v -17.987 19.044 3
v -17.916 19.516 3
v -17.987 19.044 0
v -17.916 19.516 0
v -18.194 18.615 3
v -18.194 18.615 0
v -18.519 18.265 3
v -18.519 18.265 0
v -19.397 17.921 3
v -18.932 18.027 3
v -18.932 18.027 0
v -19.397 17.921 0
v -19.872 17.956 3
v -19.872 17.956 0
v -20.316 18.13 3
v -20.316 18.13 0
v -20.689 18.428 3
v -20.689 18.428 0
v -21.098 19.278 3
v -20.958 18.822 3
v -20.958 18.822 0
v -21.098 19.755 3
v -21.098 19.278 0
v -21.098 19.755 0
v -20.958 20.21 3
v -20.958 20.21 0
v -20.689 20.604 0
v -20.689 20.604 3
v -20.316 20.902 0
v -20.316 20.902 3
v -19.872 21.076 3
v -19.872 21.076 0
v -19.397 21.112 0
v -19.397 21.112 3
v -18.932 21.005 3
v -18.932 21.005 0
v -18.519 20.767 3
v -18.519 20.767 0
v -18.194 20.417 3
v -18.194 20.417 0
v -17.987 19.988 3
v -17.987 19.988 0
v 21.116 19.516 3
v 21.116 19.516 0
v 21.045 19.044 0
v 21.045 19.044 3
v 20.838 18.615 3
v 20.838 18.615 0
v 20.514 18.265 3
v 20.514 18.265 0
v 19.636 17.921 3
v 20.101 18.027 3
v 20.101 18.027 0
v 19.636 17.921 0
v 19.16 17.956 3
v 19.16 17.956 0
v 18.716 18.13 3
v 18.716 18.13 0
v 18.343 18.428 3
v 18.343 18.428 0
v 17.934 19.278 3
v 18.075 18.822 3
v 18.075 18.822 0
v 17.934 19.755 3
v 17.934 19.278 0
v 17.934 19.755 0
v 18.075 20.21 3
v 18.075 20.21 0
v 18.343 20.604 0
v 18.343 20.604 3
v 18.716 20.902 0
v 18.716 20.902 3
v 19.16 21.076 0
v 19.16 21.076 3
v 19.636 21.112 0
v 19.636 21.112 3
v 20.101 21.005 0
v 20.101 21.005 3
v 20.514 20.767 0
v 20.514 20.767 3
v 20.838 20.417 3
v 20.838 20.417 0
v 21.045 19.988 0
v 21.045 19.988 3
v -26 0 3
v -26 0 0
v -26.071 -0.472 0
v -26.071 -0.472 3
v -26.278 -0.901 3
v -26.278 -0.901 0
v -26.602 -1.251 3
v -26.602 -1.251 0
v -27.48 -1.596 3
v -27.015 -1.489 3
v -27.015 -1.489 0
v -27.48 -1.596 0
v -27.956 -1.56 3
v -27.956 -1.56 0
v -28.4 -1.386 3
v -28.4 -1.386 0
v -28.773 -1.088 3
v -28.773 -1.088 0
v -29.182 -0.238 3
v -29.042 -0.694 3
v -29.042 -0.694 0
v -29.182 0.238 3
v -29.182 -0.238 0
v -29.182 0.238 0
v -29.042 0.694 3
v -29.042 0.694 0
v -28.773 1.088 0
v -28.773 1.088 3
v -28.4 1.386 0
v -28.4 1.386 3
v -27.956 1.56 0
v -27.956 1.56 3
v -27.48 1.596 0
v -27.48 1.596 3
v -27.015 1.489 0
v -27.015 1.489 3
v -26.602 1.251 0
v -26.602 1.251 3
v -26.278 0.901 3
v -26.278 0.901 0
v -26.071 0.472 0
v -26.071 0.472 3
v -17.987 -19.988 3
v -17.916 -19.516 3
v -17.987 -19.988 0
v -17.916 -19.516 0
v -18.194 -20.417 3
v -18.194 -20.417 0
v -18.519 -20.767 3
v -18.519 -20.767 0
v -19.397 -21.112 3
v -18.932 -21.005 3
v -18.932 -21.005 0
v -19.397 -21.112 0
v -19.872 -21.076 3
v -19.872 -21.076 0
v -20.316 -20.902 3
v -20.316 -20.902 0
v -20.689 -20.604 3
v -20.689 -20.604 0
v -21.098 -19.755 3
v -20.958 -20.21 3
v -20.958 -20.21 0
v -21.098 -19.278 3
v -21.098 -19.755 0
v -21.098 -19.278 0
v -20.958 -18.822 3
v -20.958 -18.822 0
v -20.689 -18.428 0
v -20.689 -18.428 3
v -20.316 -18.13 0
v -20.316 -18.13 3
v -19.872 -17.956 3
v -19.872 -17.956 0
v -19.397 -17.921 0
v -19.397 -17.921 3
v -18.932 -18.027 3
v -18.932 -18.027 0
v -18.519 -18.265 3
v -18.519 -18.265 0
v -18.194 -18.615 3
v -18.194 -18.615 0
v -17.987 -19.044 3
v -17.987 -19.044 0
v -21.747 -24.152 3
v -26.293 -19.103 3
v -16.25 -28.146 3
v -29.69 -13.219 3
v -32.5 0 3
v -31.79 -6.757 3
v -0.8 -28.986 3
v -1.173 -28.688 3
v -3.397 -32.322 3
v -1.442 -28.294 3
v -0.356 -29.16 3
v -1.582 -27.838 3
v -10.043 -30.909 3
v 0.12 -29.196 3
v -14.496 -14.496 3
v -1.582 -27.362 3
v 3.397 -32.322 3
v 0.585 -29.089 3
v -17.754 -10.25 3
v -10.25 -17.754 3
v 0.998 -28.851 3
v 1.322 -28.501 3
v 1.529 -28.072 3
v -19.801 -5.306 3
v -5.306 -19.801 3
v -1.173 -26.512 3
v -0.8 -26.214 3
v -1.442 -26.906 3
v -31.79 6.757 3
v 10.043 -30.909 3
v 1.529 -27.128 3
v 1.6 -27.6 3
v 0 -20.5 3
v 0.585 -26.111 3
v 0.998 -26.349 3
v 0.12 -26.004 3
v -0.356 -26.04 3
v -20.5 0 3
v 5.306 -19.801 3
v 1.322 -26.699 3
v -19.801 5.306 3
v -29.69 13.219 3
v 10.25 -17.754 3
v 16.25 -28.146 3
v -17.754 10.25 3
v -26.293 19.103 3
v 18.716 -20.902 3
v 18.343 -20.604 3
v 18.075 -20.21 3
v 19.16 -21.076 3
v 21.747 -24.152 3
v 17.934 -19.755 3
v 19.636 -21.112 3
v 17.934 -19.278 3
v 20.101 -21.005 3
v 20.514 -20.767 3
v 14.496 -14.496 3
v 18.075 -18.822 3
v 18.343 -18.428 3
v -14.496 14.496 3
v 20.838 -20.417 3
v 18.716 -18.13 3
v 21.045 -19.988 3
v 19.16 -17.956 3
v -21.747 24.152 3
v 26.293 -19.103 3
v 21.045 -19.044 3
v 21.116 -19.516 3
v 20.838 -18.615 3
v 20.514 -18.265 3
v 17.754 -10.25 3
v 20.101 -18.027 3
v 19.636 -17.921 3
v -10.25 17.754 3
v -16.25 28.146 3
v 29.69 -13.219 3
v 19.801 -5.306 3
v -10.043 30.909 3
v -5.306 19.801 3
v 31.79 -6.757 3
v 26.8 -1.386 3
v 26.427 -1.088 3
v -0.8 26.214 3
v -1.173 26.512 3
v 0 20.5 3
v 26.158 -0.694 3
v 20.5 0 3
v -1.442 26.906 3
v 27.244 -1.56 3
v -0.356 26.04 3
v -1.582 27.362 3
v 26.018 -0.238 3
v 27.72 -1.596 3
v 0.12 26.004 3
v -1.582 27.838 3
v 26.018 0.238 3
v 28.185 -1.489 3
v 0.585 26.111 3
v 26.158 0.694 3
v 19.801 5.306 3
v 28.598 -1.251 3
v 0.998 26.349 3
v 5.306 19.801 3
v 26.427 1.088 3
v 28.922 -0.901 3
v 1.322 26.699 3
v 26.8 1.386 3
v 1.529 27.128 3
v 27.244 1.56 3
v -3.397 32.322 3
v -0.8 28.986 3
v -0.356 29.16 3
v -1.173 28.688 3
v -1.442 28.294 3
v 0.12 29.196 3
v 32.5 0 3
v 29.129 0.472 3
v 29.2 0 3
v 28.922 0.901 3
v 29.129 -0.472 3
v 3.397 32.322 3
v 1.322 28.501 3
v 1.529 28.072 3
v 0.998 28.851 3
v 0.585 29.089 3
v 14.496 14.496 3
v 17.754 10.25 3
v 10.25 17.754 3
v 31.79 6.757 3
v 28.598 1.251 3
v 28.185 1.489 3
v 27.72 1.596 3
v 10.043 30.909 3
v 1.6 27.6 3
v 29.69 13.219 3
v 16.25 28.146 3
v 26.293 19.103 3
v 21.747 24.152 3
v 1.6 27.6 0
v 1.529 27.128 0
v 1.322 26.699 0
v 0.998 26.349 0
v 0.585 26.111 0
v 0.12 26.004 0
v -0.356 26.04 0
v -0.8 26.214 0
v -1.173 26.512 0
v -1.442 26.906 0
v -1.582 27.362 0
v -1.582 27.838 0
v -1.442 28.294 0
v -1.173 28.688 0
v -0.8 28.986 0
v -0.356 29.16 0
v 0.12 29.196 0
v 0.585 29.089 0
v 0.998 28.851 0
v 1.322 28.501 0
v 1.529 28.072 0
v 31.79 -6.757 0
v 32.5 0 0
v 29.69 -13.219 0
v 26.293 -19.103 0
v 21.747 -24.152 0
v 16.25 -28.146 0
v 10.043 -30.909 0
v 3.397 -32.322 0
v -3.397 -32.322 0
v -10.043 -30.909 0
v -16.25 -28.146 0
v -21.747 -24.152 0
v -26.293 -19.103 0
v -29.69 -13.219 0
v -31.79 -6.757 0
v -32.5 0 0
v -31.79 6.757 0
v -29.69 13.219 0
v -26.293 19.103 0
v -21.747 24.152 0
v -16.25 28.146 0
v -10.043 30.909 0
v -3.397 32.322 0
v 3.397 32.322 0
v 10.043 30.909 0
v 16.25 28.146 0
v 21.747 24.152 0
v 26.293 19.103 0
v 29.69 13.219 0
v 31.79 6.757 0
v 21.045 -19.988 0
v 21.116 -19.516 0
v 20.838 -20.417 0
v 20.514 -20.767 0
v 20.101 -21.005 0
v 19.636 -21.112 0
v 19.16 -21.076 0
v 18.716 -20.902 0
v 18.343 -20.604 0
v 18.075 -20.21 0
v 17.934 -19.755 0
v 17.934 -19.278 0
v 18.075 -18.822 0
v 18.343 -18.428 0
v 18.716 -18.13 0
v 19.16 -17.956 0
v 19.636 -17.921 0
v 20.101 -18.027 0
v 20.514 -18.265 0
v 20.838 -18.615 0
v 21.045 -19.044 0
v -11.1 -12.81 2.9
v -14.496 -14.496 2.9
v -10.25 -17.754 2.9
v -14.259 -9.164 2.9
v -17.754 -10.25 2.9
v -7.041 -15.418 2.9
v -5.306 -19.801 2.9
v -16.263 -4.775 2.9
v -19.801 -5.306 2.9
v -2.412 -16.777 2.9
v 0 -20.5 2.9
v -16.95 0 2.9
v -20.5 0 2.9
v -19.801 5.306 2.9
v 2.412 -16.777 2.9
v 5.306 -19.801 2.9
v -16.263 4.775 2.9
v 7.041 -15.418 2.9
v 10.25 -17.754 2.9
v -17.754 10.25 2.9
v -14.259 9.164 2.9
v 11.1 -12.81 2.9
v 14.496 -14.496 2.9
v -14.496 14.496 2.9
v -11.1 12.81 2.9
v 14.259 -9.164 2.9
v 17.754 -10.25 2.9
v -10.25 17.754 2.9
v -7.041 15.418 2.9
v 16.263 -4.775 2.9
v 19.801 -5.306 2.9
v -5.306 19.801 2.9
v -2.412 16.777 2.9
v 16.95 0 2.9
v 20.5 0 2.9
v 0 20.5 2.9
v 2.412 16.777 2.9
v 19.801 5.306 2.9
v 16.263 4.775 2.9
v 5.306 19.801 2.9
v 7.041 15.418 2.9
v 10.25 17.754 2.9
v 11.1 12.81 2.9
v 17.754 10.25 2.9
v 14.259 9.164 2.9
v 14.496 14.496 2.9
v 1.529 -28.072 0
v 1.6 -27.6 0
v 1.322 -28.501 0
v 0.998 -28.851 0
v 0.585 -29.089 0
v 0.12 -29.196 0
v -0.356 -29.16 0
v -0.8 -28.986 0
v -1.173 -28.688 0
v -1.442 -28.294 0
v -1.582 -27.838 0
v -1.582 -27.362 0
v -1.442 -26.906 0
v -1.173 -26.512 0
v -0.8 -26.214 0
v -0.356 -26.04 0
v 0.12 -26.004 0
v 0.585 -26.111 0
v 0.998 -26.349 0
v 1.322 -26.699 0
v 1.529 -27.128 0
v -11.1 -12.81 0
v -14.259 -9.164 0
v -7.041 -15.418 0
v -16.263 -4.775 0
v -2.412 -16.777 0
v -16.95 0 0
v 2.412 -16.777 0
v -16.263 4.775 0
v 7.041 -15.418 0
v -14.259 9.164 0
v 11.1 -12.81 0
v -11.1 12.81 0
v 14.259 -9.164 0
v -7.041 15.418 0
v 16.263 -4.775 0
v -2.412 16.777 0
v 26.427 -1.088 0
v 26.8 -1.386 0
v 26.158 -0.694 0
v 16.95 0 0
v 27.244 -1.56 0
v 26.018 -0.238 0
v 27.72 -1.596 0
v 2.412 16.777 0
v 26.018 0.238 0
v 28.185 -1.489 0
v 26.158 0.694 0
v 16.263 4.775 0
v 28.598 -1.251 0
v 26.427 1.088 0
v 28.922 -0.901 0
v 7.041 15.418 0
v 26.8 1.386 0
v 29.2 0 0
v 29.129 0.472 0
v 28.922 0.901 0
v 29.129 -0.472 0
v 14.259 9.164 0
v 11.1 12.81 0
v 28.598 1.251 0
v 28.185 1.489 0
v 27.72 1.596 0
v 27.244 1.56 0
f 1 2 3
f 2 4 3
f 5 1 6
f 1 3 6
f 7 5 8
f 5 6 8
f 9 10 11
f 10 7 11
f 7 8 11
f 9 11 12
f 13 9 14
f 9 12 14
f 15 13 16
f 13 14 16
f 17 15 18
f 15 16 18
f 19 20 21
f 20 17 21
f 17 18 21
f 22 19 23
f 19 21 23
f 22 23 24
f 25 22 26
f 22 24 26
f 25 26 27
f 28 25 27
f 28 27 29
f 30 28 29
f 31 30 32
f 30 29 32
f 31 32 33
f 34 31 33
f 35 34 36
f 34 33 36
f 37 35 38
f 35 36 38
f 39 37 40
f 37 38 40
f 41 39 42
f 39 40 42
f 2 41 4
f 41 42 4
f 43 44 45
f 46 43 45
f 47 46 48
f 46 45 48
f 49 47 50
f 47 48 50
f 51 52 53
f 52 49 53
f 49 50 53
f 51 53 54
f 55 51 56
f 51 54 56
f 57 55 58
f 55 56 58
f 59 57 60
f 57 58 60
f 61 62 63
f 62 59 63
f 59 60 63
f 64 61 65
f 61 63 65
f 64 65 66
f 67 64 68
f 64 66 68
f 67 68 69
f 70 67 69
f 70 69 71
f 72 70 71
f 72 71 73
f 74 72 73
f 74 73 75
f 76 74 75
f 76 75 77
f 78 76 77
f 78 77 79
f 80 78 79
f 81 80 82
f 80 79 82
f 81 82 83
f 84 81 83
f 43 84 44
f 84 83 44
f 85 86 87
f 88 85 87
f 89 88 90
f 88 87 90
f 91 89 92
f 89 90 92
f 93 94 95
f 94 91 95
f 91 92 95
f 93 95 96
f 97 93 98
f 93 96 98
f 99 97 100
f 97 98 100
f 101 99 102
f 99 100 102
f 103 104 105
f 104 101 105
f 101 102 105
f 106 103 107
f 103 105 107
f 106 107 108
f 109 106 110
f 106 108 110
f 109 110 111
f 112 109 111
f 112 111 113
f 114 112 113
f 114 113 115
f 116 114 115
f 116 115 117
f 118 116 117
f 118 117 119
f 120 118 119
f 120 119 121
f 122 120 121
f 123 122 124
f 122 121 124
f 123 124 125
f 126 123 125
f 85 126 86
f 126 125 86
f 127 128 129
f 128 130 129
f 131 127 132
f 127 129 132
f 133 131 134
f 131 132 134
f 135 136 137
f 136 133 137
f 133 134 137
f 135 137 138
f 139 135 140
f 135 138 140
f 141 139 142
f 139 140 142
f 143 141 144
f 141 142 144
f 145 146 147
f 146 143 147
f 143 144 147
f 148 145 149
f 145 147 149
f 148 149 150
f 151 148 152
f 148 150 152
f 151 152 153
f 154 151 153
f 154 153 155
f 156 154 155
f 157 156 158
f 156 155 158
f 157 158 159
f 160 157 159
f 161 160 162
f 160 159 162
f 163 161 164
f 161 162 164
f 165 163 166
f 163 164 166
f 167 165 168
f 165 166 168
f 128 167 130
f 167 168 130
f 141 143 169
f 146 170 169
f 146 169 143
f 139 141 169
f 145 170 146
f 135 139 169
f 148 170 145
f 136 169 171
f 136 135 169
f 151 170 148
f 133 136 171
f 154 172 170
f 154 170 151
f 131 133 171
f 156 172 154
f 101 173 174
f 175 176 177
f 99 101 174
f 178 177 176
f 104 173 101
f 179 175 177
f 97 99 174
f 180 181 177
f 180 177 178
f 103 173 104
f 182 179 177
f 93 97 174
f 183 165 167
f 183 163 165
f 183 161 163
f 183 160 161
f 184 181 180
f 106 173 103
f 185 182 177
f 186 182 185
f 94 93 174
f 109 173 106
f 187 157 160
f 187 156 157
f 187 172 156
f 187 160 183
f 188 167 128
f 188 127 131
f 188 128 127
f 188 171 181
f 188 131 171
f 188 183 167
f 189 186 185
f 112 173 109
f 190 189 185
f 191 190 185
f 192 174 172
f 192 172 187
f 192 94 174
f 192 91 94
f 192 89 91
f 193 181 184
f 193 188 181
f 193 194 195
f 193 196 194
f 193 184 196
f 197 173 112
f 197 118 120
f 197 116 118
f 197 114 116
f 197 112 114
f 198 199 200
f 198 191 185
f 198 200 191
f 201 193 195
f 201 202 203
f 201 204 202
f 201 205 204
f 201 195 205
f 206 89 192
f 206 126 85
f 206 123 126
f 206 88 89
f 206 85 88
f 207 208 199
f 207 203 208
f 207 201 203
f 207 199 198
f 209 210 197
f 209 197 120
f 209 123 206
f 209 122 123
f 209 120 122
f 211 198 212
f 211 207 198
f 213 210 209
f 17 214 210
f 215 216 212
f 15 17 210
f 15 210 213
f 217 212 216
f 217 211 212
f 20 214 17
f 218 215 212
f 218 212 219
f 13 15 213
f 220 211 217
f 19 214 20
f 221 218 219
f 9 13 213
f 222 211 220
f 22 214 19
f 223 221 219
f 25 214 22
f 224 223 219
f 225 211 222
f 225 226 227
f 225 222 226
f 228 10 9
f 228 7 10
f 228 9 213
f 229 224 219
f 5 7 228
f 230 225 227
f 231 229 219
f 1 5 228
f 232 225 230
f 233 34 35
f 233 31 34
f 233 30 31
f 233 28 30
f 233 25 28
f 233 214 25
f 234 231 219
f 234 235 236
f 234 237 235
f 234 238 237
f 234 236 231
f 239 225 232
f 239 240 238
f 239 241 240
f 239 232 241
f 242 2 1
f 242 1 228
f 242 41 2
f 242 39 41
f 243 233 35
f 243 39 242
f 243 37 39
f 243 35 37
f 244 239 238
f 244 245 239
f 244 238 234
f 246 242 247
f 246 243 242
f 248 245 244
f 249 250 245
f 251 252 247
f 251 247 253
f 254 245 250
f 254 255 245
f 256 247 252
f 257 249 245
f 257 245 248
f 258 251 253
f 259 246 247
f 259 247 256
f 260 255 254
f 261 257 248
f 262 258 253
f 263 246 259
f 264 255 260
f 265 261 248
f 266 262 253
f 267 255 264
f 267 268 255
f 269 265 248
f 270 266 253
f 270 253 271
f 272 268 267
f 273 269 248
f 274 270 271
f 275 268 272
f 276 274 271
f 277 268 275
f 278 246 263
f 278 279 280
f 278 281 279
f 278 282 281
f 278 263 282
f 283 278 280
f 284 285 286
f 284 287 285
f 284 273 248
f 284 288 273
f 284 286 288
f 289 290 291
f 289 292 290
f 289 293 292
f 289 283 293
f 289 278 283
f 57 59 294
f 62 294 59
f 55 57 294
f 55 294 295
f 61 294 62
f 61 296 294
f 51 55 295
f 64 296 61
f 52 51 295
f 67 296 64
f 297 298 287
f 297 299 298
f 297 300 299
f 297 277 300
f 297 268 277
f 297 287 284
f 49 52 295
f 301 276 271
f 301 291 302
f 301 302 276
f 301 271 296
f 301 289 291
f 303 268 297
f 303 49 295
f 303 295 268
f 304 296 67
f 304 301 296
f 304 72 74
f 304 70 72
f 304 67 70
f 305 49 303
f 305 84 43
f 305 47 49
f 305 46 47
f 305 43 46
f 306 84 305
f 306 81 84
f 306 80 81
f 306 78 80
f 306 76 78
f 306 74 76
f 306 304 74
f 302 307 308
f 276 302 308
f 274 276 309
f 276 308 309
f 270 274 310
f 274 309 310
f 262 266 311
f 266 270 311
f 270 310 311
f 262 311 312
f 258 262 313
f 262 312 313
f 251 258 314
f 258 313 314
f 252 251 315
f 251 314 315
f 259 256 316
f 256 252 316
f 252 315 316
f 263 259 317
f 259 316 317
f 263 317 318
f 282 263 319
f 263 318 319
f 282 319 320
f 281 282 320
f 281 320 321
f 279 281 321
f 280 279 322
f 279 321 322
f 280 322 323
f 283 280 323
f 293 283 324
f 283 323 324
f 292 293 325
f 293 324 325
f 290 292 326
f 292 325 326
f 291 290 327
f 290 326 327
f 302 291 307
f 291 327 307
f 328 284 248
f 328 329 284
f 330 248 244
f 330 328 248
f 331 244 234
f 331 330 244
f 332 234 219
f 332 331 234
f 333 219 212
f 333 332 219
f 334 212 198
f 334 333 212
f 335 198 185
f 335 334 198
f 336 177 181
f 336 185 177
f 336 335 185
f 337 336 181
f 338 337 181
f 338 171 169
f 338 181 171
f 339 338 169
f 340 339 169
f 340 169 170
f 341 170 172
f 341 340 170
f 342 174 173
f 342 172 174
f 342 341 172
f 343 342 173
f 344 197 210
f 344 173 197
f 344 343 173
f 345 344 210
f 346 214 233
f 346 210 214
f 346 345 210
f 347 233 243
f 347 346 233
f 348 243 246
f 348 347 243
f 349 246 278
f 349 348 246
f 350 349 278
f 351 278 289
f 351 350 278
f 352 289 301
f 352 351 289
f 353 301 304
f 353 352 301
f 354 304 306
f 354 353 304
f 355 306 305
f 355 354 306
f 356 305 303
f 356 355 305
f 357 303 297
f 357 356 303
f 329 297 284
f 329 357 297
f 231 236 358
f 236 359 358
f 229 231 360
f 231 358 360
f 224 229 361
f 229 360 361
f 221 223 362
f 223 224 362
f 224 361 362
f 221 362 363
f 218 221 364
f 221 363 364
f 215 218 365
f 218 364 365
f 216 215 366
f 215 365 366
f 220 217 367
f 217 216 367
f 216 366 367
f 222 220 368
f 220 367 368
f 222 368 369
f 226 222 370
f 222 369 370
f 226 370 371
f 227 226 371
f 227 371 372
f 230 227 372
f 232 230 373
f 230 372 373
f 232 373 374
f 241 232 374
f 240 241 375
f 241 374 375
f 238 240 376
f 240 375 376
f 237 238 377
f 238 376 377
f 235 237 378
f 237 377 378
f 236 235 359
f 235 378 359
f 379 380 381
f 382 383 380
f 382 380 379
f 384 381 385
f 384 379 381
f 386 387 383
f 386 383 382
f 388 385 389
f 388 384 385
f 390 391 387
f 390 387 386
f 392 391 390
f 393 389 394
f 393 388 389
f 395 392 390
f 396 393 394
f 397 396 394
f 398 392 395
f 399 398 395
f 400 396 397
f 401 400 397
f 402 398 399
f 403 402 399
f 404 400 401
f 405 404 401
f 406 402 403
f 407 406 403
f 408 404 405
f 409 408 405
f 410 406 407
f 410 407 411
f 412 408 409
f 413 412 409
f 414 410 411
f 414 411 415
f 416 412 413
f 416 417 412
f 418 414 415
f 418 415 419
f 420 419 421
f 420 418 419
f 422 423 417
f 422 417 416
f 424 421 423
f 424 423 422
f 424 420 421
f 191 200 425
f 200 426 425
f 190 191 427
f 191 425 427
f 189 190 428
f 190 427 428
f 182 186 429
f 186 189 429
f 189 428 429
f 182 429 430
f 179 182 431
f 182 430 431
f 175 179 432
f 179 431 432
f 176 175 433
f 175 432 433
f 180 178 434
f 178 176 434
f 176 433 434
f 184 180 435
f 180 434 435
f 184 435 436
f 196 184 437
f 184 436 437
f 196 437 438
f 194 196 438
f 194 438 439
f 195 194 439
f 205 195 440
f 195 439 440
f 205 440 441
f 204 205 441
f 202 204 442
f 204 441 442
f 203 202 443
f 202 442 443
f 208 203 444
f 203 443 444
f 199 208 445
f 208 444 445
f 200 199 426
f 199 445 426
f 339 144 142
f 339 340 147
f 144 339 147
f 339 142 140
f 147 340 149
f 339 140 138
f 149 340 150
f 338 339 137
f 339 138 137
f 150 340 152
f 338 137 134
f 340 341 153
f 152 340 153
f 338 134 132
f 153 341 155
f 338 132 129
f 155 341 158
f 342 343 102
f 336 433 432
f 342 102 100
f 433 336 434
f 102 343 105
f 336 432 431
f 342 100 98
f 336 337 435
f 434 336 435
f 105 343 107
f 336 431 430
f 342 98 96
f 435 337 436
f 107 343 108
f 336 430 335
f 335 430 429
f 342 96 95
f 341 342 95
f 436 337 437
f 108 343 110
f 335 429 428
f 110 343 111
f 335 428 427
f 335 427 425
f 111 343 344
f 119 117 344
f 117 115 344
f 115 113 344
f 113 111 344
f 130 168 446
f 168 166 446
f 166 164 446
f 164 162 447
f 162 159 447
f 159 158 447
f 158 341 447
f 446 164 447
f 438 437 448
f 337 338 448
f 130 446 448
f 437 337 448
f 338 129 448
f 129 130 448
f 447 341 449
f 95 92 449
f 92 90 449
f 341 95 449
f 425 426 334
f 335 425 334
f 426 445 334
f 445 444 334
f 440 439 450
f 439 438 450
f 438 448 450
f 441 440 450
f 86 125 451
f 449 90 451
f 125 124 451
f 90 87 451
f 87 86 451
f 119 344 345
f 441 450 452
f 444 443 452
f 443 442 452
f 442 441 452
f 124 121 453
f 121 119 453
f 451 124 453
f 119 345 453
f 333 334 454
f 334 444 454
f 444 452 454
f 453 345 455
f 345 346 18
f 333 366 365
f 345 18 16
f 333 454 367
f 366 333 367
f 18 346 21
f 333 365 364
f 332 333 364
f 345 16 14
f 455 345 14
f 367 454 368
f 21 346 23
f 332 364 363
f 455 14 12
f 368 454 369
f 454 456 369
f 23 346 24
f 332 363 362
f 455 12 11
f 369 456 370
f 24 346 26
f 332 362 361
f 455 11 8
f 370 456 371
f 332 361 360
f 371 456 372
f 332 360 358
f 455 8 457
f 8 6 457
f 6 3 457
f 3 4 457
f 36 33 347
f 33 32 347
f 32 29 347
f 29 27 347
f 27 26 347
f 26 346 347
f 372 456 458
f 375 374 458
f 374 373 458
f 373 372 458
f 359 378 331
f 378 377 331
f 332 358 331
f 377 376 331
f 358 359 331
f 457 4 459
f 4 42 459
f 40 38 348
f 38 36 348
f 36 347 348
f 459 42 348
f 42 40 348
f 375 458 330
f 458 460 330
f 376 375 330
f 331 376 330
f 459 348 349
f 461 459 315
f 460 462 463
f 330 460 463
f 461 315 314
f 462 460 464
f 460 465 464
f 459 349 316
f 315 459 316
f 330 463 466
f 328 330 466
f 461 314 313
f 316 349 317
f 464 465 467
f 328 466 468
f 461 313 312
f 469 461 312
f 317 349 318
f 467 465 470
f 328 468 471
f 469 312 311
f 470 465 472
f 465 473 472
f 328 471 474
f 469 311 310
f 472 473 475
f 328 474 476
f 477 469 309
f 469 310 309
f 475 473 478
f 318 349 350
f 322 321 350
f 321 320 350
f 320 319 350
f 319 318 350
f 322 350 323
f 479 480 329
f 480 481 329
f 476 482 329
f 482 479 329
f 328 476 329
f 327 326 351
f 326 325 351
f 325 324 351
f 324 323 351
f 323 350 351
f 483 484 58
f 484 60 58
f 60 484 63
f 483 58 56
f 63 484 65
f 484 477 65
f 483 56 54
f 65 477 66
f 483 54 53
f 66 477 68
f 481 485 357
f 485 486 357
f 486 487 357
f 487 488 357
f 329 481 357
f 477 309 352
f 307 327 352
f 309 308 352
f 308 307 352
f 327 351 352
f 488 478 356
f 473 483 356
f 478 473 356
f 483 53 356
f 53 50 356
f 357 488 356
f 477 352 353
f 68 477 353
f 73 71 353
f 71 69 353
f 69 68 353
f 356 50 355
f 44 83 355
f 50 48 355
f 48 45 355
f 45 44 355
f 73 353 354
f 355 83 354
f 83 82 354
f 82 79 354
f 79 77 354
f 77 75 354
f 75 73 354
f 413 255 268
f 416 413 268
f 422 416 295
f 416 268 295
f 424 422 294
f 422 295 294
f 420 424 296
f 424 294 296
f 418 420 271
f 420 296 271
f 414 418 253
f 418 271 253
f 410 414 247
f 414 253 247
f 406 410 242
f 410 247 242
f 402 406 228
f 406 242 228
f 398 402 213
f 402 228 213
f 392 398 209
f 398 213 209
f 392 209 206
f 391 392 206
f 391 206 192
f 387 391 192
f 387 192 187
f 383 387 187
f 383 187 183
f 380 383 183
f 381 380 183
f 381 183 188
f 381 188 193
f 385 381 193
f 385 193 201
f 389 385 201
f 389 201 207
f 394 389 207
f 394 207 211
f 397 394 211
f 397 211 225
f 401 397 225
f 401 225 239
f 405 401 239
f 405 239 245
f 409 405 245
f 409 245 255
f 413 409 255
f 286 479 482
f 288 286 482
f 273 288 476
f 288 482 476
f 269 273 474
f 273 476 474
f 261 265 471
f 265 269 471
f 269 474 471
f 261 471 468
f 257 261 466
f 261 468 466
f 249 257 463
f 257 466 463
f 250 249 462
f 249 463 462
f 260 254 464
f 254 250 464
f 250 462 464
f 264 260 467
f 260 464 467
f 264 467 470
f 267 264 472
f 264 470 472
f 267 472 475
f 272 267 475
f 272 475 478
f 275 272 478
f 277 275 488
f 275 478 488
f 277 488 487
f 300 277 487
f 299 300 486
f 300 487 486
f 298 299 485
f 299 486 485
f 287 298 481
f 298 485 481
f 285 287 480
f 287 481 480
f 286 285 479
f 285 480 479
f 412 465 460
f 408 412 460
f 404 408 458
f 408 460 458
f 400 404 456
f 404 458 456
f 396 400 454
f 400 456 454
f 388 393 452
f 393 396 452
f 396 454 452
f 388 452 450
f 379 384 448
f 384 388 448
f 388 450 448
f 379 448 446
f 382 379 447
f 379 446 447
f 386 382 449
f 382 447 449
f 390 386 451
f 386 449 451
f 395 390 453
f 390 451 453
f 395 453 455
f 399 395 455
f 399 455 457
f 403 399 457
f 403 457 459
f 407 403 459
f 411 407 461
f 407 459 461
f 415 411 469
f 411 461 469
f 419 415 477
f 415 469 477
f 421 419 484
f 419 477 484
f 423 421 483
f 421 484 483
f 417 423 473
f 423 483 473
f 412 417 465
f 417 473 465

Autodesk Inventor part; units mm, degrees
ref_plane "YZ Plane" through (0, 0, 0) normal (1, 0, 0) x (0, 1, 0)
ref_plane "XZ Plane" through (0, 0, 0) normal (0, 1, 0) x (-1, 0, 0)
ref_plane "XY Plane" through (0, 0, 0) normal (0, 0, 1) x (1, 0, 0)
sketch "スケッチ1" plane through (0, 0, 0) normal (0, 0, 1) x (1, 0, 0)
  circle A0 centre (0, 0) radius 16.75 construction
  circle A1 centre (0, 0) radius 32.5
  circle A2 centre (0, 0) radius 27.6 construction
  circle A3 centre (27.6, 0) radius 1.6
  circle A4 centre (19.5161, 19.5161) radius 1.6
  circle A5 centre (0, 27.6) radius 1.6
  circle A6 centre (-19.5161, 19.5161) radius 1.6
  circle A7 centre (-27.6, 0) radius 1.6
  circle A8 centre (-19.5161, -19.5161) radius 1.6
  circle A9 centre (0, -27.6) radius 1.6
  circle A10 centre (19.5161, -19.5161) radius 1.6
  circle A11 centre (0, 0) radius 16.95
  dimension "d11" = 55.2
  dimension "d9" = 65
  dimension "d10" = 33.5
  dimension "d12" = 3.2
  dimension "d15" = 360
  dimension "d17" = 33.9
extrude "押し出し3" add sketch "スケッチ1" along normal blind 3
sketch "スケッチ3" plane through (0, 0, 3) normal (0, 0, 1) x (1, 0, 0)
  circle A0 centre (0, 0) radius 32.5 projected
  circle A1 centre (0, 0) radius 20.5 projected
  circle A2 centre (0, 0) radius 16.95 projected
  circle A3 centre (0, 0) radius 20.5
  circle A4 centre (0, 0) radius 16.95
extrude "押し出し4" cut sketch "スケッチ3" against normal blind 0.1 contours A1
properties part number "軸受けワッシャB_ダブルスラスト用(厚さ2mm_ポケットあり_ジュラコン)" material "アセタール樹脂、黒"
